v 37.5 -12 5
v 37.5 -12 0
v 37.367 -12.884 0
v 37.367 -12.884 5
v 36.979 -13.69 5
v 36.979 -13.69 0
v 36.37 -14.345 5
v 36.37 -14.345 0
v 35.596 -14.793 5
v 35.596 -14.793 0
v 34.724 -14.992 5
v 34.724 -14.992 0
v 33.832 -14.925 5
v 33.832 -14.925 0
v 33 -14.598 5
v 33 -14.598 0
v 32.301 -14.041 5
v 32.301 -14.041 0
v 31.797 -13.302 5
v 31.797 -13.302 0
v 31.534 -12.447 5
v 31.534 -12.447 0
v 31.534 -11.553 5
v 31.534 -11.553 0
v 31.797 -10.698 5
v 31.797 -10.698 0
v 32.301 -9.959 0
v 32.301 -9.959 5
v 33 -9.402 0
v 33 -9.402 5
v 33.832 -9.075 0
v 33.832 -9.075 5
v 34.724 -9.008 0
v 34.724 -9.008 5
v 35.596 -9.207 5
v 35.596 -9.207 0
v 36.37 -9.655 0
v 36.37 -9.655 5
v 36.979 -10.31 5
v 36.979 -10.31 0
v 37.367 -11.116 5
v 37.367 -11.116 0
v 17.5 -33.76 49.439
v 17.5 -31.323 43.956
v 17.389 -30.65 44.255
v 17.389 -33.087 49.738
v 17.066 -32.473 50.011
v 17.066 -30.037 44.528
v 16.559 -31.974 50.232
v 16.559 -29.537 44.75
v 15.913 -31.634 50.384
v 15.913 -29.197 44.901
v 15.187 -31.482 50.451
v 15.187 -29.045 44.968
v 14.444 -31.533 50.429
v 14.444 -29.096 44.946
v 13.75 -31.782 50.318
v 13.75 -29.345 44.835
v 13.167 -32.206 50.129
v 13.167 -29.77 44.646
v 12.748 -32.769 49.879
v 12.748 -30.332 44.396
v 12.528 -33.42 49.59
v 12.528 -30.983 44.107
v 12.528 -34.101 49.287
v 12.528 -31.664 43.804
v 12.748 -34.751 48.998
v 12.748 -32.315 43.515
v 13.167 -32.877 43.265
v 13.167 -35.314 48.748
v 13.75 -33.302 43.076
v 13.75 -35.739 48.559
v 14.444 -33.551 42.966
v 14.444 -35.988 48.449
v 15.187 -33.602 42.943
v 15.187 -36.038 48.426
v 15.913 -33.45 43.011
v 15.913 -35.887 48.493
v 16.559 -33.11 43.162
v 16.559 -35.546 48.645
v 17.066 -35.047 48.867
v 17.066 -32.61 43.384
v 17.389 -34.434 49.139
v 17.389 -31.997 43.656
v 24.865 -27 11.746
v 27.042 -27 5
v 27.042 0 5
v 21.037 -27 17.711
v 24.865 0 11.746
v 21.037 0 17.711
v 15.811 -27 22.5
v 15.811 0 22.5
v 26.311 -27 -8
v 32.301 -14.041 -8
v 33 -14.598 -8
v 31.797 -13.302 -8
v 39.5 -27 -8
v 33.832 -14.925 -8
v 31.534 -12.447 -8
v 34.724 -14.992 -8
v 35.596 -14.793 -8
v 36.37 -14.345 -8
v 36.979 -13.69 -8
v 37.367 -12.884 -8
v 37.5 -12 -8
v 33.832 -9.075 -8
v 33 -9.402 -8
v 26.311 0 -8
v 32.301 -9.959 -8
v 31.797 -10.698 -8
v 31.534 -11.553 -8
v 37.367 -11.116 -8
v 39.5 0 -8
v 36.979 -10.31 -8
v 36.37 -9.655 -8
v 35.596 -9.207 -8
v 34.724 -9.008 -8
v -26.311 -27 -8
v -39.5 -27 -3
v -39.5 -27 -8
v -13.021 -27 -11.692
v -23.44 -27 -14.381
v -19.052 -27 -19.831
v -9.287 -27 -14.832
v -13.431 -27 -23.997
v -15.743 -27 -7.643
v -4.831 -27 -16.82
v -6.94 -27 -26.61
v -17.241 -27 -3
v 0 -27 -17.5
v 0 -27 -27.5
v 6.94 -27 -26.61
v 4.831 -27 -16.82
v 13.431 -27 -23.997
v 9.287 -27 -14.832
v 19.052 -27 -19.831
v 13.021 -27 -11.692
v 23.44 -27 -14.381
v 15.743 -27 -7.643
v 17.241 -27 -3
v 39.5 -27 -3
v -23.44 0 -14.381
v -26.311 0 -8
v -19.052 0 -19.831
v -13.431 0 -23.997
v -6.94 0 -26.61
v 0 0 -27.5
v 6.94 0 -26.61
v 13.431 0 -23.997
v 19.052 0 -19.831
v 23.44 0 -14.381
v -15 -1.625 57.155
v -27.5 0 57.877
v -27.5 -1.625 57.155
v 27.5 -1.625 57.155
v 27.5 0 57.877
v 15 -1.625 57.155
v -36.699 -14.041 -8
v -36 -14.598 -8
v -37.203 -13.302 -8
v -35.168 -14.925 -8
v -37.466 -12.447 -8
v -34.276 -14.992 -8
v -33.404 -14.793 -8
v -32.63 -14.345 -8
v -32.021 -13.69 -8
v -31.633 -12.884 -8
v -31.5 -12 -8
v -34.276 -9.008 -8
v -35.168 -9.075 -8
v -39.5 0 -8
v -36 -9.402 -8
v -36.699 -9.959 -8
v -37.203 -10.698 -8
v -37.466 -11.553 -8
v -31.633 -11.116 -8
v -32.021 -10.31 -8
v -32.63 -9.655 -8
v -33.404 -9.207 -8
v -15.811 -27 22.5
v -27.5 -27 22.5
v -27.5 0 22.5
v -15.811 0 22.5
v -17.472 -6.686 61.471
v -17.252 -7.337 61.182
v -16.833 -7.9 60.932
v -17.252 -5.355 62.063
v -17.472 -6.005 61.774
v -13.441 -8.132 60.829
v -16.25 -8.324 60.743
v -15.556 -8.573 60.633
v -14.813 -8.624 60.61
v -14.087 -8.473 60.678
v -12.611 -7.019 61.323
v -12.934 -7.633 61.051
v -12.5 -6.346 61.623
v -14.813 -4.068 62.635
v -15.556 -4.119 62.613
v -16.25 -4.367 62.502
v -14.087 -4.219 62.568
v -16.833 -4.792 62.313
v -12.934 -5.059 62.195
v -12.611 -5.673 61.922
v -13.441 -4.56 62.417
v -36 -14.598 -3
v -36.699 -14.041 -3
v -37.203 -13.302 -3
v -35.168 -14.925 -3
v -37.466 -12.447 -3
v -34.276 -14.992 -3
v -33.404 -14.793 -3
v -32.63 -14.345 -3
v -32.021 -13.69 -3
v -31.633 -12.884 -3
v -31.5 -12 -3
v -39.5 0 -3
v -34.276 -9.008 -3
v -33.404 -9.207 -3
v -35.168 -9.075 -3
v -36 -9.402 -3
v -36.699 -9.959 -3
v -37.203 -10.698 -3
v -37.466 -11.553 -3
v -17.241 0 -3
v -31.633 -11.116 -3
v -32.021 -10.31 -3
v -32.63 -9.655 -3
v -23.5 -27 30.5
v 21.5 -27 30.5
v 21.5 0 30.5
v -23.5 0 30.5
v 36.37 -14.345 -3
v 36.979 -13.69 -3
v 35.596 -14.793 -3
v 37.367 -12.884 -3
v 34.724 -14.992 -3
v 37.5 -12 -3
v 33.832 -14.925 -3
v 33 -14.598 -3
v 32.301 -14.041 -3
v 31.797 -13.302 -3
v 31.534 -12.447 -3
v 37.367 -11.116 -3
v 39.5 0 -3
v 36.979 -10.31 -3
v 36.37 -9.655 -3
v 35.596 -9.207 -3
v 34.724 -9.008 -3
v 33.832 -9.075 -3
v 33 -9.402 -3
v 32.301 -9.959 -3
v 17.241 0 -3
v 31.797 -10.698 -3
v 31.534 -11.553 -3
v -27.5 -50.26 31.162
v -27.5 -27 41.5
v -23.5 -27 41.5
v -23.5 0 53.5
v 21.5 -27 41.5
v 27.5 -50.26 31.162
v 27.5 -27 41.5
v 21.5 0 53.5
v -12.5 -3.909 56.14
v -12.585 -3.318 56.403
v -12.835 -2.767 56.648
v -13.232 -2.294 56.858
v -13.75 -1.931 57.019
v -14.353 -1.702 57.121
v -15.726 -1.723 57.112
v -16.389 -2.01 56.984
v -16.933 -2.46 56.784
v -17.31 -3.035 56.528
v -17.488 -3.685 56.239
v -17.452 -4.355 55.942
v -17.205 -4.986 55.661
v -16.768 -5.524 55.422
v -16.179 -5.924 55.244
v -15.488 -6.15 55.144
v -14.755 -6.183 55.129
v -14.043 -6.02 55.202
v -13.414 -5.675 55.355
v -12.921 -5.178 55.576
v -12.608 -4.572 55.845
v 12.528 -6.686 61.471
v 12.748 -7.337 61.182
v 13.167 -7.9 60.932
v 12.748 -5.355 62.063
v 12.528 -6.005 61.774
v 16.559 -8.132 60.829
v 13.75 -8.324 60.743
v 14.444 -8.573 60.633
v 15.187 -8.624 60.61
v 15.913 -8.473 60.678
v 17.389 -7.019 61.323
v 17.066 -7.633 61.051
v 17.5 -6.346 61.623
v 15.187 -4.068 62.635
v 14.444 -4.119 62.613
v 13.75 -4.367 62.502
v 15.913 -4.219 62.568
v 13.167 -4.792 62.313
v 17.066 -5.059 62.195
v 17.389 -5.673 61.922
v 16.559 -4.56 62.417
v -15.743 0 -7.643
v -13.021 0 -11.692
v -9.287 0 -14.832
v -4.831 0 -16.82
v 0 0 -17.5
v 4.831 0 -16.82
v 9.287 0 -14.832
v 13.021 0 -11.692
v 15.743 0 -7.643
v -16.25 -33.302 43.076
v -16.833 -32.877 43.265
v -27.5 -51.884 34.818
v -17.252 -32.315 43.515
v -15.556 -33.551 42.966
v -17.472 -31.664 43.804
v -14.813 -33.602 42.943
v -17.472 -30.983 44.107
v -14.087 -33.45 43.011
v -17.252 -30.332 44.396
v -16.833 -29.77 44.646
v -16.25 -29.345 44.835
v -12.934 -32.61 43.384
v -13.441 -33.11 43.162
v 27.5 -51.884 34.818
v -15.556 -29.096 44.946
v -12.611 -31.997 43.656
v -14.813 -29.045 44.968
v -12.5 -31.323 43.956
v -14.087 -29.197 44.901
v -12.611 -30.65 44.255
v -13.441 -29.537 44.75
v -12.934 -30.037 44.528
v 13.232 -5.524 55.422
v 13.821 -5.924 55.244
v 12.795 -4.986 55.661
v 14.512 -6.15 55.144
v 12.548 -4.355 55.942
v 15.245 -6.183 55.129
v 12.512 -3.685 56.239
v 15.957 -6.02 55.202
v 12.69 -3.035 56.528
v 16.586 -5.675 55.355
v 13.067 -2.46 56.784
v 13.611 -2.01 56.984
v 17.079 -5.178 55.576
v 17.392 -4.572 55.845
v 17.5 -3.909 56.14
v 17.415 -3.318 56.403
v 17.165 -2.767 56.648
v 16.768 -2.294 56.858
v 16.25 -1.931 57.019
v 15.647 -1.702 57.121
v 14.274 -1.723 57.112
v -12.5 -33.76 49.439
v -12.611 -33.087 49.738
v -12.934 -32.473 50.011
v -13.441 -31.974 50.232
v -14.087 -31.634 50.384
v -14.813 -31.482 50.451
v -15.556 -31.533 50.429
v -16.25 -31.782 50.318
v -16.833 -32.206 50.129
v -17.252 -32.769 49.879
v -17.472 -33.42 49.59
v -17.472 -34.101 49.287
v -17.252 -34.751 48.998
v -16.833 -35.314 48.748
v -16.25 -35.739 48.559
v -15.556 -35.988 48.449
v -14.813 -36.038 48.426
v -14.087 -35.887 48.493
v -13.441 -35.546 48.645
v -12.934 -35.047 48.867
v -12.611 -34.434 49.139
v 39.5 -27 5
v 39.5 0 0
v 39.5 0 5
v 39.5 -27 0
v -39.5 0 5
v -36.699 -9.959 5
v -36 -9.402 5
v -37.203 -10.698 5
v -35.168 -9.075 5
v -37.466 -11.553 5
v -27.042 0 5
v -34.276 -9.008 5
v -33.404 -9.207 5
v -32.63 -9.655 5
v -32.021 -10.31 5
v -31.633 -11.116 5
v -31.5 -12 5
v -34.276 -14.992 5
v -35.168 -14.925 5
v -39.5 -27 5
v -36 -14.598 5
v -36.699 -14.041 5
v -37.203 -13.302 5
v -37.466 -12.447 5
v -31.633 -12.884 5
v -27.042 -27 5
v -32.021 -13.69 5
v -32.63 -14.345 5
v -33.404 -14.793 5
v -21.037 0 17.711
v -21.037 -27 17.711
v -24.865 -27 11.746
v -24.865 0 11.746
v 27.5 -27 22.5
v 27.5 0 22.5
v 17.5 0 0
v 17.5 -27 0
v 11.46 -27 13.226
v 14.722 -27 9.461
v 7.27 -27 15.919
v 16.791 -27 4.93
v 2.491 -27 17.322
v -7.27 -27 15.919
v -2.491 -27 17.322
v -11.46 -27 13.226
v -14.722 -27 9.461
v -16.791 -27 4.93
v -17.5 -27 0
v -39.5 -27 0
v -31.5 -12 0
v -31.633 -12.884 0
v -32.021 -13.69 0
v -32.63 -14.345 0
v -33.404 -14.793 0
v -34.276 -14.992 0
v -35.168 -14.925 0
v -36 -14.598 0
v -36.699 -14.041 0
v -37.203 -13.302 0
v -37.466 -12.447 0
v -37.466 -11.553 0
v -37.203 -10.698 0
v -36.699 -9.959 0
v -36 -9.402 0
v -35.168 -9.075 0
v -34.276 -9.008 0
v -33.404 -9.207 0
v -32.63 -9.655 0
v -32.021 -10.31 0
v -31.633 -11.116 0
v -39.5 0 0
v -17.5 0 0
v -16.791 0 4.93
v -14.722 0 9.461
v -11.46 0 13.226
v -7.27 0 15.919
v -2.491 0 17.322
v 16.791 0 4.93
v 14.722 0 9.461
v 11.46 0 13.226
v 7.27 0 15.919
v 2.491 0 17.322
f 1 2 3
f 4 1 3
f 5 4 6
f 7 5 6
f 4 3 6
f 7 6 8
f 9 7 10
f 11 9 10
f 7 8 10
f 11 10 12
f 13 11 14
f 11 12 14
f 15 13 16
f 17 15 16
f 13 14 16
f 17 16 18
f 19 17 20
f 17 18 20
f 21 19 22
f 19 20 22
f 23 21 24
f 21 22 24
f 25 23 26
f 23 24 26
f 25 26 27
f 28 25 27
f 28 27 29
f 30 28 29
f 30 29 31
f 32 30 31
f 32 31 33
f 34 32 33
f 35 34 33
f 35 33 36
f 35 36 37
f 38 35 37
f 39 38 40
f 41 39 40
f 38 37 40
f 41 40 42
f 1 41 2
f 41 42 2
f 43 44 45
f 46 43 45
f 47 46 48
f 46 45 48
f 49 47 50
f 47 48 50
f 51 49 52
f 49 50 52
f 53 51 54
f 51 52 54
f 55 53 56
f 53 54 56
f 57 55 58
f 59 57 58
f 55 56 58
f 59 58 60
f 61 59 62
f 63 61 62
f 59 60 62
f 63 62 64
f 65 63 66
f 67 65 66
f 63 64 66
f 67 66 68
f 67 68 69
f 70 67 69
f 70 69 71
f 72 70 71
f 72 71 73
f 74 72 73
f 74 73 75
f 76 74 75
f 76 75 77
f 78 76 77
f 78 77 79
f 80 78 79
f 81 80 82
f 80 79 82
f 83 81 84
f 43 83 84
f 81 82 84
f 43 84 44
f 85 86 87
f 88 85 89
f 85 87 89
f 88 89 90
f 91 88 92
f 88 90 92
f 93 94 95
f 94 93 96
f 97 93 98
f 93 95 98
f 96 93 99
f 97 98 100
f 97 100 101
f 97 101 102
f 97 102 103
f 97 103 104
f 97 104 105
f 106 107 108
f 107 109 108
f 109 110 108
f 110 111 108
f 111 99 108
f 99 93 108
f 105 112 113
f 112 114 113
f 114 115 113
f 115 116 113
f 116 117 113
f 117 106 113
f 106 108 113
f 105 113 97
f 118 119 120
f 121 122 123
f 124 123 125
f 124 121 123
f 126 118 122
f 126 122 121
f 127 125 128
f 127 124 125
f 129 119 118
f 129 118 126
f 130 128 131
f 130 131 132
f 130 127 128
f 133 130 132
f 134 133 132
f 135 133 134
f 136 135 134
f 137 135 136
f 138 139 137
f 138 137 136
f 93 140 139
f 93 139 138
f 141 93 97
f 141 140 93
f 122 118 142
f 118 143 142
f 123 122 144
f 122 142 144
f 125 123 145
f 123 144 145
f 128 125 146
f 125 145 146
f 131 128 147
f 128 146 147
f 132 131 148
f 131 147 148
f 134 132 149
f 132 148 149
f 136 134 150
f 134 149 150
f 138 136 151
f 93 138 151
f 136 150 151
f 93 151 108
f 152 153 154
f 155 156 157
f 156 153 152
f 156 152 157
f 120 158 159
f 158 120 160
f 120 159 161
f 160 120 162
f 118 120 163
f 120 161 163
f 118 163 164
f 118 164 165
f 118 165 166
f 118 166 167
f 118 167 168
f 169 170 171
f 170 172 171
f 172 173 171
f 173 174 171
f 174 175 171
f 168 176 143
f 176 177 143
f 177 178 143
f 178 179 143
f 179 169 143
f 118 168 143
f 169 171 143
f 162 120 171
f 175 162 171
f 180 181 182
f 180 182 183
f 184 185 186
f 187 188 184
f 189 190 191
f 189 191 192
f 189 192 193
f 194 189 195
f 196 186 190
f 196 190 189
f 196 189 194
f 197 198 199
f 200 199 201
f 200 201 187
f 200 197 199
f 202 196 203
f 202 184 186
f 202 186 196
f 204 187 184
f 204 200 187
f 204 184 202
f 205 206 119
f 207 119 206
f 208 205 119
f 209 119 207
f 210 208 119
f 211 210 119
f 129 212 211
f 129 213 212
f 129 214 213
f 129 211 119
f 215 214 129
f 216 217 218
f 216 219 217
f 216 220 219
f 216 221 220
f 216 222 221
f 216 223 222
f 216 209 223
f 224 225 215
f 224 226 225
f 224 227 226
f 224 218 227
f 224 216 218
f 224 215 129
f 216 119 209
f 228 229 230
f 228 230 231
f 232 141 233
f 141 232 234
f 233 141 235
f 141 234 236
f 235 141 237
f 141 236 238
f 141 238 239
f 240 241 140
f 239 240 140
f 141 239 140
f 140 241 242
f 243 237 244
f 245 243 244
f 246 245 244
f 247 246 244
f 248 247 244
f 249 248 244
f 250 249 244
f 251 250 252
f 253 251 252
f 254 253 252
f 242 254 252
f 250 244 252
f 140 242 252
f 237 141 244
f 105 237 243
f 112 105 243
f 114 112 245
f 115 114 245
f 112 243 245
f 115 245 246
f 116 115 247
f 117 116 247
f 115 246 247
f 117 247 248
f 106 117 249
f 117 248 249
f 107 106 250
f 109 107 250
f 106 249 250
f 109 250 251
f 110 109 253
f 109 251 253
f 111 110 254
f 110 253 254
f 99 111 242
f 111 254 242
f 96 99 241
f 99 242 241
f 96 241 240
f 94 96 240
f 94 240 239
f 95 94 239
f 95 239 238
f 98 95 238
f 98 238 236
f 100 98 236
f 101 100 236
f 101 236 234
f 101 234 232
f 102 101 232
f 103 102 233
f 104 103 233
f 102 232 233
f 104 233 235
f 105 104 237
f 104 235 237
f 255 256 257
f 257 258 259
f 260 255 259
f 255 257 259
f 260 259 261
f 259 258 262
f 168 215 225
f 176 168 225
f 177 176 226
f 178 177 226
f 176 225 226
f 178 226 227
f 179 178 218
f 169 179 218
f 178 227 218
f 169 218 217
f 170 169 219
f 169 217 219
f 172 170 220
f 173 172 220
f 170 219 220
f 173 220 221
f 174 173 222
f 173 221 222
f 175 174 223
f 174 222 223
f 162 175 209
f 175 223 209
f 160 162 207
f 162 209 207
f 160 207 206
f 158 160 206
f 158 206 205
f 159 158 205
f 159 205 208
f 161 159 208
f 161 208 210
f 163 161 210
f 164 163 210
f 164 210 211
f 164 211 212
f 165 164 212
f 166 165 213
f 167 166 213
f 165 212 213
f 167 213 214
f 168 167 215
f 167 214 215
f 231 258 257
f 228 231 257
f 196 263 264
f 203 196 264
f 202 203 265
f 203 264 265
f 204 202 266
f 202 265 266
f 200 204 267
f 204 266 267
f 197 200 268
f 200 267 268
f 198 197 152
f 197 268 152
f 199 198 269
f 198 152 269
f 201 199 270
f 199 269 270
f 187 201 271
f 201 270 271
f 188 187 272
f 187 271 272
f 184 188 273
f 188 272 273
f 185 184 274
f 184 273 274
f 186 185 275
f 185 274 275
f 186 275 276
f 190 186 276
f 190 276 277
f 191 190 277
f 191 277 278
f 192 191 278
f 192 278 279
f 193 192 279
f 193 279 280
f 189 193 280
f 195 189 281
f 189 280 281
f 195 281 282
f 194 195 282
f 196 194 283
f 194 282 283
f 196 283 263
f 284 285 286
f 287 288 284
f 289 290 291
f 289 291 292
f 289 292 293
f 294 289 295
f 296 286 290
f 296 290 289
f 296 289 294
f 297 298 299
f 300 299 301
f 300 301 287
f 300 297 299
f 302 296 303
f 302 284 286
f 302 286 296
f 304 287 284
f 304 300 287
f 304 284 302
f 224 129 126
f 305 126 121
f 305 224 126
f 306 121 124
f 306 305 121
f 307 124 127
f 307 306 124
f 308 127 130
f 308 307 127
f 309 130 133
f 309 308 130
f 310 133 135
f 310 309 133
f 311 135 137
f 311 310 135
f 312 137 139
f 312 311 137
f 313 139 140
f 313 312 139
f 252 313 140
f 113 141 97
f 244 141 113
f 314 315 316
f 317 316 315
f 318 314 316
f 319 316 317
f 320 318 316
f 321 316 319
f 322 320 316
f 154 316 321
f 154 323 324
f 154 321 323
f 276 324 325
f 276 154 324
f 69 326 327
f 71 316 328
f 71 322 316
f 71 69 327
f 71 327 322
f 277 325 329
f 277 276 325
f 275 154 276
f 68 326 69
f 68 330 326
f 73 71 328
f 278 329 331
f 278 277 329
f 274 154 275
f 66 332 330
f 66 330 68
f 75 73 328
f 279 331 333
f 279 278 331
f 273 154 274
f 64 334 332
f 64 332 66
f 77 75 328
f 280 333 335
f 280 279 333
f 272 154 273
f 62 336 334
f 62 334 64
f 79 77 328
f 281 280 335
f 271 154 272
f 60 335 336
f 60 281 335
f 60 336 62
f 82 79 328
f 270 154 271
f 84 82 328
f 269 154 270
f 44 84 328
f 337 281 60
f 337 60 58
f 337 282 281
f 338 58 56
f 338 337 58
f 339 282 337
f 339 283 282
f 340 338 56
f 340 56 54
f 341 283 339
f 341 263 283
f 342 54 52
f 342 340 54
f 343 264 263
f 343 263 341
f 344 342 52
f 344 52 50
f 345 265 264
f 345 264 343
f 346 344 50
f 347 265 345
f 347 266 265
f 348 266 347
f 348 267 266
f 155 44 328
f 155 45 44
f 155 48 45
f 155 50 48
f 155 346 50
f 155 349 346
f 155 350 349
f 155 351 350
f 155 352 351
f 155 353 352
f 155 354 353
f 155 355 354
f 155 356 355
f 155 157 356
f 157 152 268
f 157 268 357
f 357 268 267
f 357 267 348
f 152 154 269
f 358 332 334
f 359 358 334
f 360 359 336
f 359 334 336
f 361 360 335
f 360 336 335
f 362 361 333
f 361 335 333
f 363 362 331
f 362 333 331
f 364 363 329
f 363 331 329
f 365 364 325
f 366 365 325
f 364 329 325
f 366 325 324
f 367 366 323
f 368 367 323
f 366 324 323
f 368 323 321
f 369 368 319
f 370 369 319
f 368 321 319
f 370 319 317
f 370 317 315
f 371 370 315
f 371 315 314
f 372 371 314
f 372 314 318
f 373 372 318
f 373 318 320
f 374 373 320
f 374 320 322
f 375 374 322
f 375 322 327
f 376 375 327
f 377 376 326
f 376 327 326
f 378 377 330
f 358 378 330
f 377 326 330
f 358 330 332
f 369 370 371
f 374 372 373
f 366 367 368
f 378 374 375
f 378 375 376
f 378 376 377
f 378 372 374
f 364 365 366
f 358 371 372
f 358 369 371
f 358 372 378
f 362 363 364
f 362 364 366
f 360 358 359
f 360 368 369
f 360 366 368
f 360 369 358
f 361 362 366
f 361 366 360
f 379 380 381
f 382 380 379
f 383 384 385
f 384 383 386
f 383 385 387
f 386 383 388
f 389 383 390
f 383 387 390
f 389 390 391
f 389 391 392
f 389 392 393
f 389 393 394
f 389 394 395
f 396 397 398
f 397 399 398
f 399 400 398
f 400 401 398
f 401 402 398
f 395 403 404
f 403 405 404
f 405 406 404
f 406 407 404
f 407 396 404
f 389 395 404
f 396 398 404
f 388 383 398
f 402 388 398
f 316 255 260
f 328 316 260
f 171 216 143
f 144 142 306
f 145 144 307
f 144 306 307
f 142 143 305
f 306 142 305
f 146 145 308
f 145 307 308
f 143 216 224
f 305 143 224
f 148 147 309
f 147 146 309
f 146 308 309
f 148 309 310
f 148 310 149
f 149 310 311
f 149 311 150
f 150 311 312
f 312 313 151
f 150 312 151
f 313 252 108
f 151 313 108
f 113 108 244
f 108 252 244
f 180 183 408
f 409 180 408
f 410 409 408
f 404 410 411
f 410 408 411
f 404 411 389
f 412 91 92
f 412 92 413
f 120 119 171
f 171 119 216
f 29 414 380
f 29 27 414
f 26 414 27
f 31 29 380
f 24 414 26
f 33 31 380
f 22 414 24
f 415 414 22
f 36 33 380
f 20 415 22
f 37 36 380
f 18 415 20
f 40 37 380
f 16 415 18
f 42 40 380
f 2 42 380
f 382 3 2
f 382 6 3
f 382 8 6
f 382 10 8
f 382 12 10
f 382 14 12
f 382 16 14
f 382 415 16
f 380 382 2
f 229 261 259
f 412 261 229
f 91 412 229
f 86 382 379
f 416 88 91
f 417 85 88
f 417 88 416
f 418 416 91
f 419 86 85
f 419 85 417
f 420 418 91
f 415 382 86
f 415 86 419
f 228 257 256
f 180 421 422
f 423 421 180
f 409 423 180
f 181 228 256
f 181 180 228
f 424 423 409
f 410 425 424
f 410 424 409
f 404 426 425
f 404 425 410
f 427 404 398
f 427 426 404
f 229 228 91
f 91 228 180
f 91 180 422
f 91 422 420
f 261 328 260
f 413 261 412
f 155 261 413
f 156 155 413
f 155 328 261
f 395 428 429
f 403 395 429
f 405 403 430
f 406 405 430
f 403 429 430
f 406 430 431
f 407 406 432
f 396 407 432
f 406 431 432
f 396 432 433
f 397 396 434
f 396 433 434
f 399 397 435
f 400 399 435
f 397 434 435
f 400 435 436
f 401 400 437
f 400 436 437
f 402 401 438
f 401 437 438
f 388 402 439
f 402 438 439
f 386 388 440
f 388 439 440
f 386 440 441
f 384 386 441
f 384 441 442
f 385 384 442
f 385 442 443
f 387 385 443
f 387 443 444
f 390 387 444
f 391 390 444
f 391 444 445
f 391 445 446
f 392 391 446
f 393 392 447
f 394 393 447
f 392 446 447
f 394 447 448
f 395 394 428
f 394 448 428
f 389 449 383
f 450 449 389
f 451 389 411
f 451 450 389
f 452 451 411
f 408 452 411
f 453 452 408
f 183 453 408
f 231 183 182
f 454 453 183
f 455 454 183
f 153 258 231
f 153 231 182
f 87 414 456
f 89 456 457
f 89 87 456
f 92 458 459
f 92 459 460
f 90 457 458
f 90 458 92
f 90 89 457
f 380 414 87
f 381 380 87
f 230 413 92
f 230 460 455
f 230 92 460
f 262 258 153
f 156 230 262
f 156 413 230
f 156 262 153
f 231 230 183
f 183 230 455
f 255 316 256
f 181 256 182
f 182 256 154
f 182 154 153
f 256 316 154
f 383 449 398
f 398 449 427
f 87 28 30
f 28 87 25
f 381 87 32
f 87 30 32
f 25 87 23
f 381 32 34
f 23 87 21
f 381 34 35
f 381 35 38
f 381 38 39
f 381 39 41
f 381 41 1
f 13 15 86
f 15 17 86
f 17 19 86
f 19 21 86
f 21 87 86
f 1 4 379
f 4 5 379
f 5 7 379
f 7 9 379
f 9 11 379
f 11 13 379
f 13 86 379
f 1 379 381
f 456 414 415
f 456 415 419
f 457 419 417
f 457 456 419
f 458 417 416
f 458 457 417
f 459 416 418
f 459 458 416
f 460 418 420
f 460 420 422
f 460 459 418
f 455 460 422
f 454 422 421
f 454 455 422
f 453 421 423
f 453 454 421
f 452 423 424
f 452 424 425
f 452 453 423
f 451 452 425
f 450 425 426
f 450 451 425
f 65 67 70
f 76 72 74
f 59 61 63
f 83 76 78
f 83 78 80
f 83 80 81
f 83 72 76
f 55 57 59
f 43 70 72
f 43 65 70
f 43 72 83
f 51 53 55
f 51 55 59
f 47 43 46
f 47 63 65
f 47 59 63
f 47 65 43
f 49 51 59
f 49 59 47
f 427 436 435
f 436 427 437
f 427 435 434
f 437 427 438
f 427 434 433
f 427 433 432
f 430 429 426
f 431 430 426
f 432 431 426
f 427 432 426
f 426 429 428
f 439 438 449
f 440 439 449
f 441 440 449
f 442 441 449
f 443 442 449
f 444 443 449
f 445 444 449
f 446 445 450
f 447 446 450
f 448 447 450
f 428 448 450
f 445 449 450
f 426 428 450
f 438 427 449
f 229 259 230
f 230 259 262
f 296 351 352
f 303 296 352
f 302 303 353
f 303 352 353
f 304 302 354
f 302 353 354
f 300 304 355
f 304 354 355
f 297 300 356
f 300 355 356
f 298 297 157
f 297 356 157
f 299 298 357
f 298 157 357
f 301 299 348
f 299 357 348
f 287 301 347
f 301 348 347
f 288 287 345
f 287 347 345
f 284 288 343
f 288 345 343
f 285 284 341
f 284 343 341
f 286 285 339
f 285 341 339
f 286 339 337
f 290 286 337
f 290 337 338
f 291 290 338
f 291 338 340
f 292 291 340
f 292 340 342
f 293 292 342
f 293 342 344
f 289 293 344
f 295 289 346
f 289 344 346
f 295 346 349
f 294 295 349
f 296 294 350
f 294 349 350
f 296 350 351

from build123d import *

# Parameters (mm, degrees)
F0_R      = 27.5
F0_R_2    = 17.5
F1_DEPTH  = 27
F3_DEPTH  = 27
F5_DEPTH  = 6
F7_DEPTH  = 4
F9_DEPTH  = 27.001
F10_W     = 12
F10_H     = 27
F10_R     = 3
F10_W_2   = 3
F11_DEPTH = 5
F12_W     = 22
F12_H     = 27
F12_R     = 3
F13_DEPTH = 5
F15_DEPTH = 4
F16_R     = 2.5
F17_DEPTH = 6
F19_DEPTH = 55


with BuildPart() as f1:
    # F0 (on Front) → F1 (new body)
    with BuildSketch(Plane.XZ):
        Circle(F0_R)
        Circle(F0_R_2, mode=Mode.SUBTRACT)
    extrude(amount=F1_DEPTH)

    # F2 (on face) → F3 (join)
    with BuildSketch(Plane.XZ.offset(27)):
        with BuildLine():
            ThreePointArc((-15.8113883008, 22.5), (0, 27.5), (15.8113883008, 22.5))
            Line((15.8113883008, 22.5), (27.5, 22.5))
            Line((27.5, 22.5), (27.5, 30.5))
            Line((27.5, 30.5), (-27.5, 30.5))
            Line((-27.5, 30.5), (-27.5, 22.5))
            Line((-27.5, 22.5), (-15.8113883008, 22.5))
        make_face()
        with BuildLine():
            Line((-15.8113883008, 22.5), (15.8113883008, 22.5))
            ThreePointArc((15.8113883008, 22.5), (0, 27.5), (-15.8113883008, 22.5))
        make_face()
    extrude(amount=-F3_DEPTH)

    # F4 (on face) → F5 (join)
    with BuildSketch(Plane.YZ.offset(27.5)):
        Polygon((-27, 41.5), (-27, 30.5), (0, 30.5), (0, 53.5), align=None)
    extrude(amount=-F5_DEPTH)

    # F6 (on face) → F7 (join)
    with BuildSketch(Plane(origin=(-27.5, 0, 0), x_dir=(0, -1, 0), z_dir=(-1, 0, 0))):
        Polygon((27, 41.5), (0, 53.5), (0, 22.5), (27, 22.5), align=None)
    extrude(amount=-F7_DEPTH)

    # F8 (on face) → F9 (cut, through all)
    with BuildSketch(Plane(origin=(0, 0, 0), x_dir=(-1, 0, 0), z_dir=(0, 1, 0))):
        with BuildLine():
            ThreePointArc((-27.3358738657, -3), (-27.45893781, -1.5022431052), (-27.5, 0))
            Line((-27.5, 0), (-27.5, -3))
            Line((-27.5, -3), (-27.3358738657, -3))
        make_face()
        with BuildLine():
            Line((27.5, -3), (27.5, 0))
            ThreePointArc((27.5, 0), (27.45893781, -1.5022431052), (27.3358738657, -3))
            Line((27.3358738657, -3), (27.5, -3))
        make_face()
        with BuildLine():
            ThreePointArc((-17.2409396496, -3), (-17.4351146235, -1.5055823014), (-17.5, 0))
            Line((-17.5, 0), (-27.5, 0))
            ThreePointArc((-27.5, 0), (-27.45893781, -1.5022431052), (-27.3358738657, -3))
            Line((-27.3358738657, -3), (-17.2409396496, -3))
        make_face()
        with BuildLine():
            Line((27.5, 0), (17.5, 0))
            ThreePointArc((17.5, 0), (17.4351146235, -1.5055823014), (17.2409396496, -3))
            Line((17.2409396496, -3), (27.3358738657, -3))
            ThreePointArc((27.3358738657, -3), (27.45893781, -1.5022431052), (27.5, 0))
        make_face()
    extrude(amount=-F9_DEPTH, mode=Mode.SUBTRACT)

    # F10 (on face) → F11 (join)
    with BuildSketch(Plane(origin=(0, 0, 0), x_dir=(1, 0, 0), z_dir=(0, 0, -1))):
        with Locations((33.5, 13.5)):
            Rectangle(F10_W, F10_H)
        with Locations((34.5, 12)):
            Circle(F10_R, mode=Mode.SUBTRACT)
        with Locations((26, 13.5)):
            Rectangle(F10_W_2, F10_H)
        with Locations((-26, 13.5)):
            Rectangle(F10_W_2, F10_H)
        with Locations((-33.5, 13.5)):
            Rectangle(F10_W, F10_H)
        with Locations((-34.5, 12)):
            Circle(F10_R, mode=Mode.SUBTRACT)
    extrude(amount=-F11_DEPTH)

    # F12 (on face) → F13 (join)
    with BuildSketch(Plane.XY.offset(-3)):
        with Locations((-28.5, -13.5)):
            Rectangle(F12_W, F12_H)
        with Locations((-34.5, -12)):
            Circle(F12_R, mode=Mode.SUBTRACT)
        with Locations((28.5, -13.5)):
            Rectangle(F12_W, F12_H)
        with Locations((34.5, -12)):
            Circle(F12_R, mode=Mode.SUBTRACT)
    extrude(amount=-F13_DEPTH)

    # F14 (on face) → F15 (join)
    with BuildSketch(Plane(origin=(0, -19.8556701031, 44.675257732), x_dir=(1, 0, 0), z_dir=(0, -0.4061384661, 0.9138115486))):
        Polygon((27.5, 21.7284079339), (-27.5, 21.7284079339), (-27.5, -33.2715920661), (27.5, -33.2715920661), (27.5, -7.8181654715), align=None)
    extrude(amount=F15_DEPTH)

    # F16 (on face) → F17 (join)
    with BuildSketch(Plane(origin=(0, -21.4802239673, 48.3305039264), x_dir=(1, 0, 0), z_dir=(0, -0.4061384661, 0.9138115486))):
        with Locations((-15, -10.7715920661)):
            Circle(F16_R)
        with Locations((-15, 19.2284079339)):
            Circle(F16_R)
        with Locations((15, 19.2284079339)):
            Circle(F16_R)
        with Locations((15, -10.7715920661)):
            Circle(F16_R)
    extrude(amount=F17_DEPTH)

    # F18 (on face) → F19 (join, through all)
    with BuildSketch(Plane.YZ.offset(27.5)):
        Polygon((0, 57.8772701341), (-1.6245538642, 57.1552461945), (0, 53.5), align=None)
    extrude(amount=-F19_DEPTH)


solid = f1.part
